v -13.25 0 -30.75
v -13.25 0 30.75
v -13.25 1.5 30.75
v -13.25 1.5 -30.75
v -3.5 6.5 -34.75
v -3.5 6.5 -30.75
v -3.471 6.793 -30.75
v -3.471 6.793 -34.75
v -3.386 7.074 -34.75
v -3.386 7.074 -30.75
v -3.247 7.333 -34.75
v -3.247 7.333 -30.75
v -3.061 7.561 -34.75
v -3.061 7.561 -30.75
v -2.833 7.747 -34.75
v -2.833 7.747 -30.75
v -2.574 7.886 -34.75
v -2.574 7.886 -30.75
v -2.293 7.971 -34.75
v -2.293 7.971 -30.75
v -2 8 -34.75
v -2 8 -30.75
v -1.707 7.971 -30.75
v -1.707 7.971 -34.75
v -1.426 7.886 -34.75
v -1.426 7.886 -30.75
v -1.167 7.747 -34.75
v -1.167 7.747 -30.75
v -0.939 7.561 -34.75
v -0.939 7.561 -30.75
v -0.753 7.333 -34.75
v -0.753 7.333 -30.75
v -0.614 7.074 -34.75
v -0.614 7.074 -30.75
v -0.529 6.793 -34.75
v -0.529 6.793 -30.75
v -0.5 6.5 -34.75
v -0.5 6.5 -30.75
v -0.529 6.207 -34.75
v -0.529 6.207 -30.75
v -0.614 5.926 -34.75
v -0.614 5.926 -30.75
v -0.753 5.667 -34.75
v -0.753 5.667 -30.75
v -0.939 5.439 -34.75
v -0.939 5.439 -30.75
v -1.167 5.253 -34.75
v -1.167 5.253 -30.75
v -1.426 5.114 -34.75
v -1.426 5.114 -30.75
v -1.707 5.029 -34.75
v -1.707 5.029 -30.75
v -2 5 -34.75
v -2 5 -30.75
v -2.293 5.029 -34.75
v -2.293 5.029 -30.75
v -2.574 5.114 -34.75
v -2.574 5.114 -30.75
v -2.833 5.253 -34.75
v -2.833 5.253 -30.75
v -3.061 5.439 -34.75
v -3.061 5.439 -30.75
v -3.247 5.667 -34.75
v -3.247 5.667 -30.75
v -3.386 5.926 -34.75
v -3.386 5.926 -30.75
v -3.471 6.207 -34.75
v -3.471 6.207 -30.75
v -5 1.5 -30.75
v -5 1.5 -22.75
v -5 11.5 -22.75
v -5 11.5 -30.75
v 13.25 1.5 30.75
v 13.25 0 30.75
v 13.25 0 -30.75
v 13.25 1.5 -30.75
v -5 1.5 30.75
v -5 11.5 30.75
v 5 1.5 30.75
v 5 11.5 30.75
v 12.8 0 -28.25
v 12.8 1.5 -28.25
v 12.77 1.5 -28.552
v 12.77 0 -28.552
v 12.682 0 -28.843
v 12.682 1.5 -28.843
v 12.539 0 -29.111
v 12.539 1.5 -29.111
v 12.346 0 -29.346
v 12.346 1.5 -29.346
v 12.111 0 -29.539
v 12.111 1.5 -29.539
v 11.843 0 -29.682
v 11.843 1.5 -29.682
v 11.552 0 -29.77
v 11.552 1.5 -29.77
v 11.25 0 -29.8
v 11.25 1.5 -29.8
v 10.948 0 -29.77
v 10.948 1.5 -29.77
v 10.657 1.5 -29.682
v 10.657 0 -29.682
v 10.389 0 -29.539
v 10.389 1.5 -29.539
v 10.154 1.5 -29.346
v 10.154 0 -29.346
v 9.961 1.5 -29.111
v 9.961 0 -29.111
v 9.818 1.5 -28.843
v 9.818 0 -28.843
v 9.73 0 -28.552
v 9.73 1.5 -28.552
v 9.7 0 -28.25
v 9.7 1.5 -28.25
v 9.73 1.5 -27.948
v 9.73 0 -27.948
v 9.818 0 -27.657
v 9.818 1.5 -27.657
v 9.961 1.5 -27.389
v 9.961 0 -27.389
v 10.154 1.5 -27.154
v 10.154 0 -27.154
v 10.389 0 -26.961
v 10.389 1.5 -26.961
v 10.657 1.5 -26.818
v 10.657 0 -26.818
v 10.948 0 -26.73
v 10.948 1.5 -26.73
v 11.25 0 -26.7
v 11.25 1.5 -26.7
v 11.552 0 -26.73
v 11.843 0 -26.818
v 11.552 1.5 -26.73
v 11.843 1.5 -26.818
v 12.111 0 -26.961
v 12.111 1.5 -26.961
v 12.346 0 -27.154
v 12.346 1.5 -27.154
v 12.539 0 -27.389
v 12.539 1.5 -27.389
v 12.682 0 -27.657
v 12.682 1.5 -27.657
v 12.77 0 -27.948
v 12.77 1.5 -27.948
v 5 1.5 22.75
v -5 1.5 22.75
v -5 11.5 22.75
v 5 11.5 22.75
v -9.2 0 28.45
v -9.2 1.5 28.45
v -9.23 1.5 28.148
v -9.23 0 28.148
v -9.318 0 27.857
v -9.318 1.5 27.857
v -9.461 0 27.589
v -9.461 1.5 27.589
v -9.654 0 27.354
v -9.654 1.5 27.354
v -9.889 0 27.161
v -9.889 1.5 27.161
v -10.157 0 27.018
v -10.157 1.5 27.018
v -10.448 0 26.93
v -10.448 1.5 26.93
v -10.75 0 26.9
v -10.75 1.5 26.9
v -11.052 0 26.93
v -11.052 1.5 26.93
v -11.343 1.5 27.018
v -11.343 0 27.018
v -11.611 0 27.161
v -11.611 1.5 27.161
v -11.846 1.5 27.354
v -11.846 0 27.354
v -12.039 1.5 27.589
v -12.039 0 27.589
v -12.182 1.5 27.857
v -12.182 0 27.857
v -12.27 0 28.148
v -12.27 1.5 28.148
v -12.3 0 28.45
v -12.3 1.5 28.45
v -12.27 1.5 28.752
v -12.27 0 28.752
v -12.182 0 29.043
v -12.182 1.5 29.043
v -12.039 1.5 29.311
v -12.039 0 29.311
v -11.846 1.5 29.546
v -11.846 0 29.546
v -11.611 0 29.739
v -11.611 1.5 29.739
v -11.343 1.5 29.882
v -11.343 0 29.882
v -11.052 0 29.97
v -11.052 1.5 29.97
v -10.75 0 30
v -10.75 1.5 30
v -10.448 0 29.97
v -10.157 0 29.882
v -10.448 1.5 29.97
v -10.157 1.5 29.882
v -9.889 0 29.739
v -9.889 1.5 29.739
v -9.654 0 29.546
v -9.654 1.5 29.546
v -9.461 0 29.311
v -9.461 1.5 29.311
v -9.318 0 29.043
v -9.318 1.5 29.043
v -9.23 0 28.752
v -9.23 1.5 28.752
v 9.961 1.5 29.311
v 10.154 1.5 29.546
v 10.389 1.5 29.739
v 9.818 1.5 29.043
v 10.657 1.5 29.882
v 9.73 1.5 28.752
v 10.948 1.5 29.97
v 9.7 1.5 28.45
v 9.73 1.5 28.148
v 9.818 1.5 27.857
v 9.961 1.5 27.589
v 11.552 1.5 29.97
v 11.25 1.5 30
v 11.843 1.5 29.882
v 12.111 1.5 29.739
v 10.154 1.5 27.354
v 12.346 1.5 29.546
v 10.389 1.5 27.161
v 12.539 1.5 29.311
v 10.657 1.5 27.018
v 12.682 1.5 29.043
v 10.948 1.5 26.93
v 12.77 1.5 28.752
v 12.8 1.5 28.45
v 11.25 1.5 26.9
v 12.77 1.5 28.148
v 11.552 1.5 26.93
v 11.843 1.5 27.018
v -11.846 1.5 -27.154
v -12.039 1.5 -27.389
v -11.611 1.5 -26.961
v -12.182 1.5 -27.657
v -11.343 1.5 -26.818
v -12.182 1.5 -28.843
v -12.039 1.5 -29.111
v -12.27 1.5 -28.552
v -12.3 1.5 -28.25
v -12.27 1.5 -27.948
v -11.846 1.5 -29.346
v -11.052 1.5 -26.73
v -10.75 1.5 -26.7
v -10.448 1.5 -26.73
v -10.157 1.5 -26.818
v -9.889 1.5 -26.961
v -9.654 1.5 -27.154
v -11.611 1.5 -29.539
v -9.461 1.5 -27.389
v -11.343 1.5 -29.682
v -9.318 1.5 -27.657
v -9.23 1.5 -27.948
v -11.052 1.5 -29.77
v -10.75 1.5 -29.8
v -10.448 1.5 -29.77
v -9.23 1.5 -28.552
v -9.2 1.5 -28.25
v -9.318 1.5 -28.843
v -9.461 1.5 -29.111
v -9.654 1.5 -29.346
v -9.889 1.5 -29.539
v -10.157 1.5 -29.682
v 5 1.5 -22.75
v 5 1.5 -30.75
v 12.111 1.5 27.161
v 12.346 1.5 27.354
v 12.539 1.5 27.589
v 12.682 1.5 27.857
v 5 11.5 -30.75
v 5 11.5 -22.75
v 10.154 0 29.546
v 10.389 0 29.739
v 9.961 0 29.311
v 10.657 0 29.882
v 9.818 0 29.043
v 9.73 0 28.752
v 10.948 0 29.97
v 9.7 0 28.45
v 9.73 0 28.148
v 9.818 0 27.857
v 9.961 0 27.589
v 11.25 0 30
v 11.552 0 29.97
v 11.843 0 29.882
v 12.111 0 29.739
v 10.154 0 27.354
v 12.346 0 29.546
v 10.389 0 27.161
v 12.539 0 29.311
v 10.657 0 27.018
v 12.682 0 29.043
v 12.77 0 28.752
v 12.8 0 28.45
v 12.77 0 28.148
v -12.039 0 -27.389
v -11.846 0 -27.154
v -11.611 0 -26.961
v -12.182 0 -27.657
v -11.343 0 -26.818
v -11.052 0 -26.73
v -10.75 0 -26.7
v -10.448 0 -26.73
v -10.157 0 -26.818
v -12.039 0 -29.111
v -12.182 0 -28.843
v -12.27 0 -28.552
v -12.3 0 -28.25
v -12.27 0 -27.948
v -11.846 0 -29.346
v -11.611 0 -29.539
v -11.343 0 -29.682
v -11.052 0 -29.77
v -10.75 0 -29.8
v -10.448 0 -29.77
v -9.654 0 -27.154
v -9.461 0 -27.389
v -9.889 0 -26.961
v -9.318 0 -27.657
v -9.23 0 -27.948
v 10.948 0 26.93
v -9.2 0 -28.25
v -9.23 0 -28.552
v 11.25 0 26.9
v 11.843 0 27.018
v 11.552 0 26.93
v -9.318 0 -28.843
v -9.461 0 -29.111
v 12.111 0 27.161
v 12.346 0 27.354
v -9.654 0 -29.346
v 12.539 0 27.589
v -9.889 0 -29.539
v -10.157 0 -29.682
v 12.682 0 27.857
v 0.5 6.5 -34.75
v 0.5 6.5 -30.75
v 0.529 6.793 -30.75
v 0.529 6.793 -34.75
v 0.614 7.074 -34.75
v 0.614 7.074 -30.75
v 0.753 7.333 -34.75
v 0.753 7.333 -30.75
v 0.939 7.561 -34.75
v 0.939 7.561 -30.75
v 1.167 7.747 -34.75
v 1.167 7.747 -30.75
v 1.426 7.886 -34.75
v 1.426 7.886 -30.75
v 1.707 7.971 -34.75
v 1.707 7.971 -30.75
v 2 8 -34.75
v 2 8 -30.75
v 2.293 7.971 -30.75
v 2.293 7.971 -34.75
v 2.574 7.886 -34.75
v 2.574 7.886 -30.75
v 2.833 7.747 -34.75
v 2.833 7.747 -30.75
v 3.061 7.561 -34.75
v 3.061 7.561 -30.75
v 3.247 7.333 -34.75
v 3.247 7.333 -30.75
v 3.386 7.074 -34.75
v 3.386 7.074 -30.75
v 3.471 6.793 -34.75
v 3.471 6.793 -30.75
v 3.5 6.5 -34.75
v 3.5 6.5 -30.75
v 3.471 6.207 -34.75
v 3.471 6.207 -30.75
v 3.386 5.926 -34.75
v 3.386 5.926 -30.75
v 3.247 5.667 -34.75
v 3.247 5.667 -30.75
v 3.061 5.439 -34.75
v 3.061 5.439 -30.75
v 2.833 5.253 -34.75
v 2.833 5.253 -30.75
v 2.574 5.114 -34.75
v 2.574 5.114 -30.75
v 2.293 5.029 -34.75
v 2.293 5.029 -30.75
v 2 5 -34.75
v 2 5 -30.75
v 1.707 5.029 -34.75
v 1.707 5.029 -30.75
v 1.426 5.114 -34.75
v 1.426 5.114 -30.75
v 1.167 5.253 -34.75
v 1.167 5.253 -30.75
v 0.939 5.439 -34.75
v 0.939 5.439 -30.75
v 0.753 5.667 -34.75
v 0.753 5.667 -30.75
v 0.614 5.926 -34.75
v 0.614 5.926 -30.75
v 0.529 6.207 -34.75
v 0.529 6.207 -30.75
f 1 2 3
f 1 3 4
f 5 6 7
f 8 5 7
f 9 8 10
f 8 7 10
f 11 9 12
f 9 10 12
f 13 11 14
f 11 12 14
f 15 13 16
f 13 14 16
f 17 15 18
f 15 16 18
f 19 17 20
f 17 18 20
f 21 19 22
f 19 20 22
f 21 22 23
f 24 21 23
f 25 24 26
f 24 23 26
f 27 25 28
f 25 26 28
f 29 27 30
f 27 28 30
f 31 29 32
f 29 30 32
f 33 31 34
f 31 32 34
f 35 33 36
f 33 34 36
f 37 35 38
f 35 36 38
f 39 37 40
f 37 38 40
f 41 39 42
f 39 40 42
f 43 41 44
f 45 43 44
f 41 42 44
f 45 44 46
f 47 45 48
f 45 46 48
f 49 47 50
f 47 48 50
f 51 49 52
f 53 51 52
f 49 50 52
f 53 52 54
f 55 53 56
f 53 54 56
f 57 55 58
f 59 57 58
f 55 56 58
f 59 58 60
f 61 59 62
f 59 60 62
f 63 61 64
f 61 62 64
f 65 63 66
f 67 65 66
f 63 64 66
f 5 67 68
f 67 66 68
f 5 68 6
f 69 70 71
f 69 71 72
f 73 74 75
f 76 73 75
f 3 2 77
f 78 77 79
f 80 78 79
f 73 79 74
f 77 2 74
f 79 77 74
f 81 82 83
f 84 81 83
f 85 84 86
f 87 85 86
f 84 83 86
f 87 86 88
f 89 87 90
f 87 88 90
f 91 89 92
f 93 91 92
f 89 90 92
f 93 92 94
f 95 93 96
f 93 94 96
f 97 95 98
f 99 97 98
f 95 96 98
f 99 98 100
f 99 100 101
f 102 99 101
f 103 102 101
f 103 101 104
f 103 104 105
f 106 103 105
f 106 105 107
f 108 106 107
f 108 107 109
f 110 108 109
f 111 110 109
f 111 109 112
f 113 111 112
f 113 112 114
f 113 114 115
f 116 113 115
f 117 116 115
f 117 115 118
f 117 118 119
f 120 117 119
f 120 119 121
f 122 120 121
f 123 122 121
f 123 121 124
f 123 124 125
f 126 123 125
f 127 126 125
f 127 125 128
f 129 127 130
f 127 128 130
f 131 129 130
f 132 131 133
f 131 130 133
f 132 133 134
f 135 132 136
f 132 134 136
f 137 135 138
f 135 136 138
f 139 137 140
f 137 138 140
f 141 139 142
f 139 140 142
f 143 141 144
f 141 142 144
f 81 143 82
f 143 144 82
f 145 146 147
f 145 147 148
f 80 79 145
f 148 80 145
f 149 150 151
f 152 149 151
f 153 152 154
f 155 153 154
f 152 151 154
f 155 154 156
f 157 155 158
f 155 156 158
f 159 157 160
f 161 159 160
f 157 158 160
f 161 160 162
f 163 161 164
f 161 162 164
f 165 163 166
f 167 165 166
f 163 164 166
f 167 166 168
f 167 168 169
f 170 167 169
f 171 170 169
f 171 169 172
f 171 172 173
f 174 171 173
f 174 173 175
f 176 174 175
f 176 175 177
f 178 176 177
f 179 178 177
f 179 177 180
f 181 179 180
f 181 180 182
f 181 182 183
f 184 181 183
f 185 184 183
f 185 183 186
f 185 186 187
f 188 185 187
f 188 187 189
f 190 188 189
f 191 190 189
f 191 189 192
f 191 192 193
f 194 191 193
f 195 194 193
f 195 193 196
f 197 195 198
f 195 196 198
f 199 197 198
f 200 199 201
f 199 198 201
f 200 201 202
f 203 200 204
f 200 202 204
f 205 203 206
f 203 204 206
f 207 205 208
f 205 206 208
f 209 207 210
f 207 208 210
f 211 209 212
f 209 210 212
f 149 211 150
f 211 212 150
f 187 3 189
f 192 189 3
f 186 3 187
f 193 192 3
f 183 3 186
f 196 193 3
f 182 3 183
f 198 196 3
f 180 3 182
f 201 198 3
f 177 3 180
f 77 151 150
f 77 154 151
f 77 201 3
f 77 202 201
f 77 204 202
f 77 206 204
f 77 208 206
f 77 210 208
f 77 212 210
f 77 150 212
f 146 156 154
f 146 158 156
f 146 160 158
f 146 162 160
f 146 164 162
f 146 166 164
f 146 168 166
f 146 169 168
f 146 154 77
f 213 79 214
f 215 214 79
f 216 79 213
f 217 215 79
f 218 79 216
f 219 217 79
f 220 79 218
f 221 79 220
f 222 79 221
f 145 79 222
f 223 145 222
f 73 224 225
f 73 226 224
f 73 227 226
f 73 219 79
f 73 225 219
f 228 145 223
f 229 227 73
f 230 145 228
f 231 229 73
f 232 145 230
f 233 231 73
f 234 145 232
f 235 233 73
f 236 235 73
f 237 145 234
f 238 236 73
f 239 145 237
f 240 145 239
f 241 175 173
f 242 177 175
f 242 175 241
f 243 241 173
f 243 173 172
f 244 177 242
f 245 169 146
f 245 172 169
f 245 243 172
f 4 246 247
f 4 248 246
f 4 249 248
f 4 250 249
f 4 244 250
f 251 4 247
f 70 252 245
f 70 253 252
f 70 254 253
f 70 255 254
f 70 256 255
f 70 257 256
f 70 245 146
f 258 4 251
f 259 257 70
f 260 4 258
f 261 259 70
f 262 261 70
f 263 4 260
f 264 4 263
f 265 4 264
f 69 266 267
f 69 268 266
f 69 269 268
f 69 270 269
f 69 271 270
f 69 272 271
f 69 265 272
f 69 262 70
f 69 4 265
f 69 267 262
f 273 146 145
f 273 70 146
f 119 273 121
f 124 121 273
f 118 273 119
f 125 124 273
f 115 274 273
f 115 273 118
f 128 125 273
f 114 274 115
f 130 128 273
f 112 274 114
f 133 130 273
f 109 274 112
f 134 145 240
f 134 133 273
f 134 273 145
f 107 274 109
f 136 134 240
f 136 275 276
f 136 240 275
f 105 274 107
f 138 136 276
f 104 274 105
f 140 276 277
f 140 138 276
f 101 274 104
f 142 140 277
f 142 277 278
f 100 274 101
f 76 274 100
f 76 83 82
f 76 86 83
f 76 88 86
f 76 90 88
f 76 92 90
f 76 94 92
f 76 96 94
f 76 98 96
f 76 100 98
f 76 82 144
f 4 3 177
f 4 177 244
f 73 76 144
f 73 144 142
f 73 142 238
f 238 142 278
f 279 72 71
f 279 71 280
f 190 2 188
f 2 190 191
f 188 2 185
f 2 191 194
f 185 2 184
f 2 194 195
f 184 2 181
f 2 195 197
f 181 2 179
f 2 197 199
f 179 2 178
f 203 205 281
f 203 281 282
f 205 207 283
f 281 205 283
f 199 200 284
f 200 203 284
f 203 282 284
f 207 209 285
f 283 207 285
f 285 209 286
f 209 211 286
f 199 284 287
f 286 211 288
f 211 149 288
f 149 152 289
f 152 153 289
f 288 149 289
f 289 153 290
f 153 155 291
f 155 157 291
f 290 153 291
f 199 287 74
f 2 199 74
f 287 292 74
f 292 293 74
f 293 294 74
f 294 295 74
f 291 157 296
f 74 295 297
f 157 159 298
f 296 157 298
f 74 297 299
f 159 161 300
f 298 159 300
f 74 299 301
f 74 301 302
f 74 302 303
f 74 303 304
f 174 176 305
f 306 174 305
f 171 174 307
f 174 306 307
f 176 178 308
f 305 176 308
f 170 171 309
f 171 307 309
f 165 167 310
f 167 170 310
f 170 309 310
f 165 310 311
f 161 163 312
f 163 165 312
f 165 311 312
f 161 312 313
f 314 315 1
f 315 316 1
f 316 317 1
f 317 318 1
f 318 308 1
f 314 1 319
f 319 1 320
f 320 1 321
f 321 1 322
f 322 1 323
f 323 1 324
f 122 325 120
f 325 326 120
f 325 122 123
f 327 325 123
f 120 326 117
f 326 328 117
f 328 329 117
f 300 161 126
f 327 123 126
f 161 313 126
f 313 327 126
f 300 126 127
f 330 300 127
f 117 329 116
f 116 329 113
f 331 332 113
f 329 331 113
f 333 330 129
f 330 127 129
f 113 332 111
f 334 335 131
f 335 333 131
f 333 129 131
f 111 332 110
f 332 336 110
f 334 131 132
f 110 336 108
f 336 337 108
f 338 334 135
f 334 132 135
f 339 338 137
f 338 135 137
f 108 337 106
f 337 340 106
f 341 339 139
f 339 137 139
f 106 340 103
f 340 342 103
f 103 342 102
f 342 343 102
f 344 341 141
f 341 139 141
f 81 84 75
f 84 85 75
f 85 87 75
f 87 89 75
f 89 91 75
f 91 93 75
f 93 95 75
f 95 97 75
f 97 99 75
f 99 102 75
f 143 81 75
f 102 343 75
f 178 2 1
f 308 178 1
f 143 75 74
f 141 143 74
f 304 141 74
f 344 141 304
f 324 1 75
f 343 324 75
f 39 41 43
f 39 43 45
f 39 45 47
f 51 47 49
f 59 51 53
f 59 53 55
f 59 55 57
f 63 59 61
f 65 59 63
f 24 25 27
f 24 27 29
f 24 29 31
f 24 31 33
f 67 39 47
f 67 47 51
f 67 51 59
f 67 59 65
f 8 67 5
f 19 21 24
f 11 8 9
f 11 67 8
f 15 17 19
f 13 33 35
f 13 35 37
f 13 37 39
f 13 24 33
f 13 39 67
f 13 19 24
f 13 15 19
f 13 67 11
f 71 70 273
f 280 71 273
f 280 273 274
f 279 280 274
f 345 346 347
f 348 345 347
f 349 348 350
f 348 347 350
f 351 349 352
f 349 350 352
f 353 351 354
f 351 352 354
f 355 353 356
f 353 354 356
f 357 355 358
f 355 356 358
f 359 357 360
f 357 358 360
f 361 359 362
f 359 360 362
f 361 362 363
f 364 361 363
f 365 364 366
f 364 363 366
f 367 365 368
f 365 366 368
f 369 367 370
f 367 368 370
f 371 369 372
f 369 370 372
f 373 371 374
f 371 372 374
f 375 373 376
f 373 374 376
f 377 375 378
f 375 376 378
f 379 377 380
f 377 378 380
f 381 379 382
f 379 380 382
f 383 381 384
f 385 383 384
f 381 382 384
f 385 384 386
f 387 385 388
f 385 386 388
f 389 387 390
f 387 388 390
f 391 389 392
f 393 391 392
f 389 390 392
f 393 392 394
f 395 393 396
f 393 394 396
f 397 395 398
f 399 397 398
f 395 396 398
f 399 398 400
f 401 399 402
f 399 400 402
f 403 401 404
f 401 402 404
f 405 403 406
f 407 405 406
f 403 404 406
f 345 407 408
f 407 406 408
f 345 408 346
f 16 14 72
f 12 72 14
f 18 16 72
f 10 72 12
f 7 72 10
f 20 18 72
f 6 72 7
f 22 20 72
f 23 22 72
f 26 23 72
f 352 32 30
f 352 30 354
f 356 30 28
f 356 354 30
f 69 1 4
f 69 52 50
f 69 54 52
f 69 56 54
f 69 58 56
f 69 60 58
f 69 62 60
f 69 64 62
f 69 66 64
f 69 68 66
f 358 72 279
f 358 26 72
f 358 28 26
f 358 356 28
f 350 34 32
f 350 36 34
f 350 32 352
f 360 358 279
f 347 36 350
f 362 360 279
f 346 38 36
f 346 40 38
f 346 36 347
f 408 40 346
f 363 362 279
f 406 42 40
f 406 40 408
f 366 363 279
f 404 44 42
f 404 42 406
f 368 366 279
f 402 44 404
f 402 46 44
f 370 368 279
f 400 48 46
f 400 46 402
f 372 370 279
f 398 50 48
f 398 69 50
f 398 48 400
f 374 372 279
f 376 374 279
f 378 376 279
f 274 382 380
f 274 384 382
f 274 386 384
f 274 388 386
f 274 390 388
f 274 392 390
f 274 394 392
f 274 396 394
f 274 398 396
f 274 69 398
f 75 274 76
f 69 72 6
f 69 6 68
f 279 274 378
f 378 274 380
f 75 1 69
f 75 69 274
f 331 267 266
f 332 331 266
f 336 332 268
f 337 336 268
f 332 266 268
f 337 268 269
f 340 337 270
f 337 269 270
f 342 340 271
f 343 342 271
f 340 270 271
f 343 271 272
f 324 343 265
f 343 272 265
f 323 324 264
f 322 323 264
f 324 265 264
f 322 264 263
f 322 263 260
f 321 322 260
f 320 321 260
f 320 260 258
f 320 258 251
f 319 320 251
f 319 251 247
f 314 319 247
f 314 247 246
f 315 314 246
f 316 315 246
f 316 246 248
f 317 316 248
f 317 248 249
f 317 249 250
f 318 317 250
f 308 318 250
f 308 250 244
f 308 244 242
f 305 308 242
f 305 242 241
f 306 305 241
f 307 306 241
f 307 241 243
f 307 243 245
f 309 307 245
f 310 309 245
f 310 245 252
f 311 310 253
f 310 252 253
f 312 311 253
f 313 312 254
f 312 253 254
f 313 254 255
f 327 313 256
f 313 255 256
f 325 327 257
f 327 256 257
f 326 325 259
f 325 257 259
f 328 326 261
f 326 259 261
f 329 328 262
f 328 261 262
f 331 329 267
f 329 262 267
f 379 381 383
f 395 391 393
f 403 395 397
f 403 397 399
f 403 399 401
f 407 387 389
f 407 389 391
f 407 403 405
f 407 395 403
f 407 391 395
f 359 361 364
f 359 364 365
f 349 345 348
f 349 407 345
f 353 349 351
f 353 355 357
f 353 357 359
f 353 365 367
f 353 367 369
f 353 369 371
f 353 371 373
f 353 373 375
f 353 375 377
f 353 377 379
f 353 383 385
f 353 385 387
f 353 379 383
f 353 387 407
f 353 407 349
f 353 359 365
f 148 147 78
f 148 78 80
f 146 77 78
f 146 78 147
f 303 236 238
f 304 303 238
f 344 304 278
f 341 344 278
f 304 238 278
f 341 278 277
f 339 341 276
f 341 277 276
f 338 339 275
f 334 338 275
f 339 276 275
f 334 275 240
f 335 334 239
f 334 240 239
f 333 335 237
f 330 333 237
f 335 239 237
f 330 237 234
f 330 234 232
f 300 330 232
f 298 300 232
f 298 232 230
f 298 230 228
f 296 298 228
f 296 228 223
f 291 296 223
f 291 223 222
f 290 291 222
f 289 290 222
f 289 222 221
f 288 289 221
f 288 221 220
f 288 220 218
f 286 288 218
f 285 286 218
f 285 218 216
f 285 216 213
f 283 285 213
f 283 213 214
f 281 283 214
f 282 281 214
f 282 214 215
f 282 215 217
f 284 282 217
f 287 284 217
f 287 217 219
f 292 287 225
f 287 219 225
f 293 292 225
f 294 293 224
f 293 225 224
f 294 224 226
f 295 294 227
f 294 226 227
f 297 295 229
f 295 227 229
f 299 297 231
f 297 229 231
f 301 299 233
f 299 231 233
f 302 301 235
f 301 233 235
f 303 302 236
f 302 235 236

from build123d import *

# Parameters (mm, degrees)
SKIZZE1_W                       = 26.5
SKIZZE1_H                       = 61.5
AUFSATZ_LINEAR_AUSTRAGEN1_DEPTH = 1.5
SKIZZE2_R                       = 1.55
SCHNITT_LINEAR_AUSTRAGEN1_DEPTH = 2.5
SKIZZE3_W                       = 10
SKIZZE3_H                       = 8
AUFSATZ_LINEAR_AUSTRAGEN2_DEPTH = 10
SKIZZE4_R                       = 1.5
AUFSATZ_LINEAR_AUSTRAGEN3_DEPTH = 4


with BuildPart() as part:
    # Skizze1 → Aufsatz-Linear austragen1 (new body)
    with BuildSketch(Plane(origin=(0, 0, 0), x_dir=(1, 0, 0), z_dir=(0, 1, 0))):
        Rectangle(SKIZZE1_W, SKIZZE1_H)
    extrude(amount=AUFSATZ_LINEAR_AUSTRAGEN1_DEPTH)

    # Skizze2 → Schnitt-Linear austragen1 (cut, through all)
    with BuildSketch(Plane(origin=(0, 1.5, 0), x_dir=(1, 0, 0), z_dir=(0, 1, 0))):
        with Locations((-10.75, 28.25)):
            Circle(SKIZZE2_R)
        with Locations((11.25, 28.25)):
            Circle(SKIZZE2_R)
        with Locations((11.25, -28.45)):
            Circle(SKIZZE2_R)
        with Locations((-10.75, -28.45)):
            Circle(SKIZZE2_R)
    extrude(amount=-SCHNITT_LINEAR_AUSTRAGEN1_DEPTH, mode=Mode.SUBTRACT)

    # Skizze3 → Aufsatz-Linear austragen2 (add)
    with BuildSketch(Plane(origin=(0, 1.5, 0), x_dir=(1, 0, 0), z_dir=(0, 1, 0))):
        with Locations((0, -26.75)):
            Rectangle(SKIZZE3_W, SKIZZE3_H)
        with Locations((0, 26.75)):
            Rectangle(SKIZZE3_W, SKIZZE3_H)
    extrude(amount=AUFSATZ_LINEAR_AUSTRAGEN2_DEPTH)

    # Skizze4 → Aufsatz-Linear austragen3 (add)
    with BuildSketch(Plane(origin=(0, 0, -30.75), x_dir=(-1, 0, 0), z_dir=(0, 0, -1))):
        with Locations((-2, 6.5)):
            Circle(SKIZZE4_R)
        with Locations((2, 6.5)):
            Circle(SKIZZE4_R)
    extrude(amount=AUFSATZ_LINEAR_AUSTRAGEN3_DEPTH)


solid = part.part
